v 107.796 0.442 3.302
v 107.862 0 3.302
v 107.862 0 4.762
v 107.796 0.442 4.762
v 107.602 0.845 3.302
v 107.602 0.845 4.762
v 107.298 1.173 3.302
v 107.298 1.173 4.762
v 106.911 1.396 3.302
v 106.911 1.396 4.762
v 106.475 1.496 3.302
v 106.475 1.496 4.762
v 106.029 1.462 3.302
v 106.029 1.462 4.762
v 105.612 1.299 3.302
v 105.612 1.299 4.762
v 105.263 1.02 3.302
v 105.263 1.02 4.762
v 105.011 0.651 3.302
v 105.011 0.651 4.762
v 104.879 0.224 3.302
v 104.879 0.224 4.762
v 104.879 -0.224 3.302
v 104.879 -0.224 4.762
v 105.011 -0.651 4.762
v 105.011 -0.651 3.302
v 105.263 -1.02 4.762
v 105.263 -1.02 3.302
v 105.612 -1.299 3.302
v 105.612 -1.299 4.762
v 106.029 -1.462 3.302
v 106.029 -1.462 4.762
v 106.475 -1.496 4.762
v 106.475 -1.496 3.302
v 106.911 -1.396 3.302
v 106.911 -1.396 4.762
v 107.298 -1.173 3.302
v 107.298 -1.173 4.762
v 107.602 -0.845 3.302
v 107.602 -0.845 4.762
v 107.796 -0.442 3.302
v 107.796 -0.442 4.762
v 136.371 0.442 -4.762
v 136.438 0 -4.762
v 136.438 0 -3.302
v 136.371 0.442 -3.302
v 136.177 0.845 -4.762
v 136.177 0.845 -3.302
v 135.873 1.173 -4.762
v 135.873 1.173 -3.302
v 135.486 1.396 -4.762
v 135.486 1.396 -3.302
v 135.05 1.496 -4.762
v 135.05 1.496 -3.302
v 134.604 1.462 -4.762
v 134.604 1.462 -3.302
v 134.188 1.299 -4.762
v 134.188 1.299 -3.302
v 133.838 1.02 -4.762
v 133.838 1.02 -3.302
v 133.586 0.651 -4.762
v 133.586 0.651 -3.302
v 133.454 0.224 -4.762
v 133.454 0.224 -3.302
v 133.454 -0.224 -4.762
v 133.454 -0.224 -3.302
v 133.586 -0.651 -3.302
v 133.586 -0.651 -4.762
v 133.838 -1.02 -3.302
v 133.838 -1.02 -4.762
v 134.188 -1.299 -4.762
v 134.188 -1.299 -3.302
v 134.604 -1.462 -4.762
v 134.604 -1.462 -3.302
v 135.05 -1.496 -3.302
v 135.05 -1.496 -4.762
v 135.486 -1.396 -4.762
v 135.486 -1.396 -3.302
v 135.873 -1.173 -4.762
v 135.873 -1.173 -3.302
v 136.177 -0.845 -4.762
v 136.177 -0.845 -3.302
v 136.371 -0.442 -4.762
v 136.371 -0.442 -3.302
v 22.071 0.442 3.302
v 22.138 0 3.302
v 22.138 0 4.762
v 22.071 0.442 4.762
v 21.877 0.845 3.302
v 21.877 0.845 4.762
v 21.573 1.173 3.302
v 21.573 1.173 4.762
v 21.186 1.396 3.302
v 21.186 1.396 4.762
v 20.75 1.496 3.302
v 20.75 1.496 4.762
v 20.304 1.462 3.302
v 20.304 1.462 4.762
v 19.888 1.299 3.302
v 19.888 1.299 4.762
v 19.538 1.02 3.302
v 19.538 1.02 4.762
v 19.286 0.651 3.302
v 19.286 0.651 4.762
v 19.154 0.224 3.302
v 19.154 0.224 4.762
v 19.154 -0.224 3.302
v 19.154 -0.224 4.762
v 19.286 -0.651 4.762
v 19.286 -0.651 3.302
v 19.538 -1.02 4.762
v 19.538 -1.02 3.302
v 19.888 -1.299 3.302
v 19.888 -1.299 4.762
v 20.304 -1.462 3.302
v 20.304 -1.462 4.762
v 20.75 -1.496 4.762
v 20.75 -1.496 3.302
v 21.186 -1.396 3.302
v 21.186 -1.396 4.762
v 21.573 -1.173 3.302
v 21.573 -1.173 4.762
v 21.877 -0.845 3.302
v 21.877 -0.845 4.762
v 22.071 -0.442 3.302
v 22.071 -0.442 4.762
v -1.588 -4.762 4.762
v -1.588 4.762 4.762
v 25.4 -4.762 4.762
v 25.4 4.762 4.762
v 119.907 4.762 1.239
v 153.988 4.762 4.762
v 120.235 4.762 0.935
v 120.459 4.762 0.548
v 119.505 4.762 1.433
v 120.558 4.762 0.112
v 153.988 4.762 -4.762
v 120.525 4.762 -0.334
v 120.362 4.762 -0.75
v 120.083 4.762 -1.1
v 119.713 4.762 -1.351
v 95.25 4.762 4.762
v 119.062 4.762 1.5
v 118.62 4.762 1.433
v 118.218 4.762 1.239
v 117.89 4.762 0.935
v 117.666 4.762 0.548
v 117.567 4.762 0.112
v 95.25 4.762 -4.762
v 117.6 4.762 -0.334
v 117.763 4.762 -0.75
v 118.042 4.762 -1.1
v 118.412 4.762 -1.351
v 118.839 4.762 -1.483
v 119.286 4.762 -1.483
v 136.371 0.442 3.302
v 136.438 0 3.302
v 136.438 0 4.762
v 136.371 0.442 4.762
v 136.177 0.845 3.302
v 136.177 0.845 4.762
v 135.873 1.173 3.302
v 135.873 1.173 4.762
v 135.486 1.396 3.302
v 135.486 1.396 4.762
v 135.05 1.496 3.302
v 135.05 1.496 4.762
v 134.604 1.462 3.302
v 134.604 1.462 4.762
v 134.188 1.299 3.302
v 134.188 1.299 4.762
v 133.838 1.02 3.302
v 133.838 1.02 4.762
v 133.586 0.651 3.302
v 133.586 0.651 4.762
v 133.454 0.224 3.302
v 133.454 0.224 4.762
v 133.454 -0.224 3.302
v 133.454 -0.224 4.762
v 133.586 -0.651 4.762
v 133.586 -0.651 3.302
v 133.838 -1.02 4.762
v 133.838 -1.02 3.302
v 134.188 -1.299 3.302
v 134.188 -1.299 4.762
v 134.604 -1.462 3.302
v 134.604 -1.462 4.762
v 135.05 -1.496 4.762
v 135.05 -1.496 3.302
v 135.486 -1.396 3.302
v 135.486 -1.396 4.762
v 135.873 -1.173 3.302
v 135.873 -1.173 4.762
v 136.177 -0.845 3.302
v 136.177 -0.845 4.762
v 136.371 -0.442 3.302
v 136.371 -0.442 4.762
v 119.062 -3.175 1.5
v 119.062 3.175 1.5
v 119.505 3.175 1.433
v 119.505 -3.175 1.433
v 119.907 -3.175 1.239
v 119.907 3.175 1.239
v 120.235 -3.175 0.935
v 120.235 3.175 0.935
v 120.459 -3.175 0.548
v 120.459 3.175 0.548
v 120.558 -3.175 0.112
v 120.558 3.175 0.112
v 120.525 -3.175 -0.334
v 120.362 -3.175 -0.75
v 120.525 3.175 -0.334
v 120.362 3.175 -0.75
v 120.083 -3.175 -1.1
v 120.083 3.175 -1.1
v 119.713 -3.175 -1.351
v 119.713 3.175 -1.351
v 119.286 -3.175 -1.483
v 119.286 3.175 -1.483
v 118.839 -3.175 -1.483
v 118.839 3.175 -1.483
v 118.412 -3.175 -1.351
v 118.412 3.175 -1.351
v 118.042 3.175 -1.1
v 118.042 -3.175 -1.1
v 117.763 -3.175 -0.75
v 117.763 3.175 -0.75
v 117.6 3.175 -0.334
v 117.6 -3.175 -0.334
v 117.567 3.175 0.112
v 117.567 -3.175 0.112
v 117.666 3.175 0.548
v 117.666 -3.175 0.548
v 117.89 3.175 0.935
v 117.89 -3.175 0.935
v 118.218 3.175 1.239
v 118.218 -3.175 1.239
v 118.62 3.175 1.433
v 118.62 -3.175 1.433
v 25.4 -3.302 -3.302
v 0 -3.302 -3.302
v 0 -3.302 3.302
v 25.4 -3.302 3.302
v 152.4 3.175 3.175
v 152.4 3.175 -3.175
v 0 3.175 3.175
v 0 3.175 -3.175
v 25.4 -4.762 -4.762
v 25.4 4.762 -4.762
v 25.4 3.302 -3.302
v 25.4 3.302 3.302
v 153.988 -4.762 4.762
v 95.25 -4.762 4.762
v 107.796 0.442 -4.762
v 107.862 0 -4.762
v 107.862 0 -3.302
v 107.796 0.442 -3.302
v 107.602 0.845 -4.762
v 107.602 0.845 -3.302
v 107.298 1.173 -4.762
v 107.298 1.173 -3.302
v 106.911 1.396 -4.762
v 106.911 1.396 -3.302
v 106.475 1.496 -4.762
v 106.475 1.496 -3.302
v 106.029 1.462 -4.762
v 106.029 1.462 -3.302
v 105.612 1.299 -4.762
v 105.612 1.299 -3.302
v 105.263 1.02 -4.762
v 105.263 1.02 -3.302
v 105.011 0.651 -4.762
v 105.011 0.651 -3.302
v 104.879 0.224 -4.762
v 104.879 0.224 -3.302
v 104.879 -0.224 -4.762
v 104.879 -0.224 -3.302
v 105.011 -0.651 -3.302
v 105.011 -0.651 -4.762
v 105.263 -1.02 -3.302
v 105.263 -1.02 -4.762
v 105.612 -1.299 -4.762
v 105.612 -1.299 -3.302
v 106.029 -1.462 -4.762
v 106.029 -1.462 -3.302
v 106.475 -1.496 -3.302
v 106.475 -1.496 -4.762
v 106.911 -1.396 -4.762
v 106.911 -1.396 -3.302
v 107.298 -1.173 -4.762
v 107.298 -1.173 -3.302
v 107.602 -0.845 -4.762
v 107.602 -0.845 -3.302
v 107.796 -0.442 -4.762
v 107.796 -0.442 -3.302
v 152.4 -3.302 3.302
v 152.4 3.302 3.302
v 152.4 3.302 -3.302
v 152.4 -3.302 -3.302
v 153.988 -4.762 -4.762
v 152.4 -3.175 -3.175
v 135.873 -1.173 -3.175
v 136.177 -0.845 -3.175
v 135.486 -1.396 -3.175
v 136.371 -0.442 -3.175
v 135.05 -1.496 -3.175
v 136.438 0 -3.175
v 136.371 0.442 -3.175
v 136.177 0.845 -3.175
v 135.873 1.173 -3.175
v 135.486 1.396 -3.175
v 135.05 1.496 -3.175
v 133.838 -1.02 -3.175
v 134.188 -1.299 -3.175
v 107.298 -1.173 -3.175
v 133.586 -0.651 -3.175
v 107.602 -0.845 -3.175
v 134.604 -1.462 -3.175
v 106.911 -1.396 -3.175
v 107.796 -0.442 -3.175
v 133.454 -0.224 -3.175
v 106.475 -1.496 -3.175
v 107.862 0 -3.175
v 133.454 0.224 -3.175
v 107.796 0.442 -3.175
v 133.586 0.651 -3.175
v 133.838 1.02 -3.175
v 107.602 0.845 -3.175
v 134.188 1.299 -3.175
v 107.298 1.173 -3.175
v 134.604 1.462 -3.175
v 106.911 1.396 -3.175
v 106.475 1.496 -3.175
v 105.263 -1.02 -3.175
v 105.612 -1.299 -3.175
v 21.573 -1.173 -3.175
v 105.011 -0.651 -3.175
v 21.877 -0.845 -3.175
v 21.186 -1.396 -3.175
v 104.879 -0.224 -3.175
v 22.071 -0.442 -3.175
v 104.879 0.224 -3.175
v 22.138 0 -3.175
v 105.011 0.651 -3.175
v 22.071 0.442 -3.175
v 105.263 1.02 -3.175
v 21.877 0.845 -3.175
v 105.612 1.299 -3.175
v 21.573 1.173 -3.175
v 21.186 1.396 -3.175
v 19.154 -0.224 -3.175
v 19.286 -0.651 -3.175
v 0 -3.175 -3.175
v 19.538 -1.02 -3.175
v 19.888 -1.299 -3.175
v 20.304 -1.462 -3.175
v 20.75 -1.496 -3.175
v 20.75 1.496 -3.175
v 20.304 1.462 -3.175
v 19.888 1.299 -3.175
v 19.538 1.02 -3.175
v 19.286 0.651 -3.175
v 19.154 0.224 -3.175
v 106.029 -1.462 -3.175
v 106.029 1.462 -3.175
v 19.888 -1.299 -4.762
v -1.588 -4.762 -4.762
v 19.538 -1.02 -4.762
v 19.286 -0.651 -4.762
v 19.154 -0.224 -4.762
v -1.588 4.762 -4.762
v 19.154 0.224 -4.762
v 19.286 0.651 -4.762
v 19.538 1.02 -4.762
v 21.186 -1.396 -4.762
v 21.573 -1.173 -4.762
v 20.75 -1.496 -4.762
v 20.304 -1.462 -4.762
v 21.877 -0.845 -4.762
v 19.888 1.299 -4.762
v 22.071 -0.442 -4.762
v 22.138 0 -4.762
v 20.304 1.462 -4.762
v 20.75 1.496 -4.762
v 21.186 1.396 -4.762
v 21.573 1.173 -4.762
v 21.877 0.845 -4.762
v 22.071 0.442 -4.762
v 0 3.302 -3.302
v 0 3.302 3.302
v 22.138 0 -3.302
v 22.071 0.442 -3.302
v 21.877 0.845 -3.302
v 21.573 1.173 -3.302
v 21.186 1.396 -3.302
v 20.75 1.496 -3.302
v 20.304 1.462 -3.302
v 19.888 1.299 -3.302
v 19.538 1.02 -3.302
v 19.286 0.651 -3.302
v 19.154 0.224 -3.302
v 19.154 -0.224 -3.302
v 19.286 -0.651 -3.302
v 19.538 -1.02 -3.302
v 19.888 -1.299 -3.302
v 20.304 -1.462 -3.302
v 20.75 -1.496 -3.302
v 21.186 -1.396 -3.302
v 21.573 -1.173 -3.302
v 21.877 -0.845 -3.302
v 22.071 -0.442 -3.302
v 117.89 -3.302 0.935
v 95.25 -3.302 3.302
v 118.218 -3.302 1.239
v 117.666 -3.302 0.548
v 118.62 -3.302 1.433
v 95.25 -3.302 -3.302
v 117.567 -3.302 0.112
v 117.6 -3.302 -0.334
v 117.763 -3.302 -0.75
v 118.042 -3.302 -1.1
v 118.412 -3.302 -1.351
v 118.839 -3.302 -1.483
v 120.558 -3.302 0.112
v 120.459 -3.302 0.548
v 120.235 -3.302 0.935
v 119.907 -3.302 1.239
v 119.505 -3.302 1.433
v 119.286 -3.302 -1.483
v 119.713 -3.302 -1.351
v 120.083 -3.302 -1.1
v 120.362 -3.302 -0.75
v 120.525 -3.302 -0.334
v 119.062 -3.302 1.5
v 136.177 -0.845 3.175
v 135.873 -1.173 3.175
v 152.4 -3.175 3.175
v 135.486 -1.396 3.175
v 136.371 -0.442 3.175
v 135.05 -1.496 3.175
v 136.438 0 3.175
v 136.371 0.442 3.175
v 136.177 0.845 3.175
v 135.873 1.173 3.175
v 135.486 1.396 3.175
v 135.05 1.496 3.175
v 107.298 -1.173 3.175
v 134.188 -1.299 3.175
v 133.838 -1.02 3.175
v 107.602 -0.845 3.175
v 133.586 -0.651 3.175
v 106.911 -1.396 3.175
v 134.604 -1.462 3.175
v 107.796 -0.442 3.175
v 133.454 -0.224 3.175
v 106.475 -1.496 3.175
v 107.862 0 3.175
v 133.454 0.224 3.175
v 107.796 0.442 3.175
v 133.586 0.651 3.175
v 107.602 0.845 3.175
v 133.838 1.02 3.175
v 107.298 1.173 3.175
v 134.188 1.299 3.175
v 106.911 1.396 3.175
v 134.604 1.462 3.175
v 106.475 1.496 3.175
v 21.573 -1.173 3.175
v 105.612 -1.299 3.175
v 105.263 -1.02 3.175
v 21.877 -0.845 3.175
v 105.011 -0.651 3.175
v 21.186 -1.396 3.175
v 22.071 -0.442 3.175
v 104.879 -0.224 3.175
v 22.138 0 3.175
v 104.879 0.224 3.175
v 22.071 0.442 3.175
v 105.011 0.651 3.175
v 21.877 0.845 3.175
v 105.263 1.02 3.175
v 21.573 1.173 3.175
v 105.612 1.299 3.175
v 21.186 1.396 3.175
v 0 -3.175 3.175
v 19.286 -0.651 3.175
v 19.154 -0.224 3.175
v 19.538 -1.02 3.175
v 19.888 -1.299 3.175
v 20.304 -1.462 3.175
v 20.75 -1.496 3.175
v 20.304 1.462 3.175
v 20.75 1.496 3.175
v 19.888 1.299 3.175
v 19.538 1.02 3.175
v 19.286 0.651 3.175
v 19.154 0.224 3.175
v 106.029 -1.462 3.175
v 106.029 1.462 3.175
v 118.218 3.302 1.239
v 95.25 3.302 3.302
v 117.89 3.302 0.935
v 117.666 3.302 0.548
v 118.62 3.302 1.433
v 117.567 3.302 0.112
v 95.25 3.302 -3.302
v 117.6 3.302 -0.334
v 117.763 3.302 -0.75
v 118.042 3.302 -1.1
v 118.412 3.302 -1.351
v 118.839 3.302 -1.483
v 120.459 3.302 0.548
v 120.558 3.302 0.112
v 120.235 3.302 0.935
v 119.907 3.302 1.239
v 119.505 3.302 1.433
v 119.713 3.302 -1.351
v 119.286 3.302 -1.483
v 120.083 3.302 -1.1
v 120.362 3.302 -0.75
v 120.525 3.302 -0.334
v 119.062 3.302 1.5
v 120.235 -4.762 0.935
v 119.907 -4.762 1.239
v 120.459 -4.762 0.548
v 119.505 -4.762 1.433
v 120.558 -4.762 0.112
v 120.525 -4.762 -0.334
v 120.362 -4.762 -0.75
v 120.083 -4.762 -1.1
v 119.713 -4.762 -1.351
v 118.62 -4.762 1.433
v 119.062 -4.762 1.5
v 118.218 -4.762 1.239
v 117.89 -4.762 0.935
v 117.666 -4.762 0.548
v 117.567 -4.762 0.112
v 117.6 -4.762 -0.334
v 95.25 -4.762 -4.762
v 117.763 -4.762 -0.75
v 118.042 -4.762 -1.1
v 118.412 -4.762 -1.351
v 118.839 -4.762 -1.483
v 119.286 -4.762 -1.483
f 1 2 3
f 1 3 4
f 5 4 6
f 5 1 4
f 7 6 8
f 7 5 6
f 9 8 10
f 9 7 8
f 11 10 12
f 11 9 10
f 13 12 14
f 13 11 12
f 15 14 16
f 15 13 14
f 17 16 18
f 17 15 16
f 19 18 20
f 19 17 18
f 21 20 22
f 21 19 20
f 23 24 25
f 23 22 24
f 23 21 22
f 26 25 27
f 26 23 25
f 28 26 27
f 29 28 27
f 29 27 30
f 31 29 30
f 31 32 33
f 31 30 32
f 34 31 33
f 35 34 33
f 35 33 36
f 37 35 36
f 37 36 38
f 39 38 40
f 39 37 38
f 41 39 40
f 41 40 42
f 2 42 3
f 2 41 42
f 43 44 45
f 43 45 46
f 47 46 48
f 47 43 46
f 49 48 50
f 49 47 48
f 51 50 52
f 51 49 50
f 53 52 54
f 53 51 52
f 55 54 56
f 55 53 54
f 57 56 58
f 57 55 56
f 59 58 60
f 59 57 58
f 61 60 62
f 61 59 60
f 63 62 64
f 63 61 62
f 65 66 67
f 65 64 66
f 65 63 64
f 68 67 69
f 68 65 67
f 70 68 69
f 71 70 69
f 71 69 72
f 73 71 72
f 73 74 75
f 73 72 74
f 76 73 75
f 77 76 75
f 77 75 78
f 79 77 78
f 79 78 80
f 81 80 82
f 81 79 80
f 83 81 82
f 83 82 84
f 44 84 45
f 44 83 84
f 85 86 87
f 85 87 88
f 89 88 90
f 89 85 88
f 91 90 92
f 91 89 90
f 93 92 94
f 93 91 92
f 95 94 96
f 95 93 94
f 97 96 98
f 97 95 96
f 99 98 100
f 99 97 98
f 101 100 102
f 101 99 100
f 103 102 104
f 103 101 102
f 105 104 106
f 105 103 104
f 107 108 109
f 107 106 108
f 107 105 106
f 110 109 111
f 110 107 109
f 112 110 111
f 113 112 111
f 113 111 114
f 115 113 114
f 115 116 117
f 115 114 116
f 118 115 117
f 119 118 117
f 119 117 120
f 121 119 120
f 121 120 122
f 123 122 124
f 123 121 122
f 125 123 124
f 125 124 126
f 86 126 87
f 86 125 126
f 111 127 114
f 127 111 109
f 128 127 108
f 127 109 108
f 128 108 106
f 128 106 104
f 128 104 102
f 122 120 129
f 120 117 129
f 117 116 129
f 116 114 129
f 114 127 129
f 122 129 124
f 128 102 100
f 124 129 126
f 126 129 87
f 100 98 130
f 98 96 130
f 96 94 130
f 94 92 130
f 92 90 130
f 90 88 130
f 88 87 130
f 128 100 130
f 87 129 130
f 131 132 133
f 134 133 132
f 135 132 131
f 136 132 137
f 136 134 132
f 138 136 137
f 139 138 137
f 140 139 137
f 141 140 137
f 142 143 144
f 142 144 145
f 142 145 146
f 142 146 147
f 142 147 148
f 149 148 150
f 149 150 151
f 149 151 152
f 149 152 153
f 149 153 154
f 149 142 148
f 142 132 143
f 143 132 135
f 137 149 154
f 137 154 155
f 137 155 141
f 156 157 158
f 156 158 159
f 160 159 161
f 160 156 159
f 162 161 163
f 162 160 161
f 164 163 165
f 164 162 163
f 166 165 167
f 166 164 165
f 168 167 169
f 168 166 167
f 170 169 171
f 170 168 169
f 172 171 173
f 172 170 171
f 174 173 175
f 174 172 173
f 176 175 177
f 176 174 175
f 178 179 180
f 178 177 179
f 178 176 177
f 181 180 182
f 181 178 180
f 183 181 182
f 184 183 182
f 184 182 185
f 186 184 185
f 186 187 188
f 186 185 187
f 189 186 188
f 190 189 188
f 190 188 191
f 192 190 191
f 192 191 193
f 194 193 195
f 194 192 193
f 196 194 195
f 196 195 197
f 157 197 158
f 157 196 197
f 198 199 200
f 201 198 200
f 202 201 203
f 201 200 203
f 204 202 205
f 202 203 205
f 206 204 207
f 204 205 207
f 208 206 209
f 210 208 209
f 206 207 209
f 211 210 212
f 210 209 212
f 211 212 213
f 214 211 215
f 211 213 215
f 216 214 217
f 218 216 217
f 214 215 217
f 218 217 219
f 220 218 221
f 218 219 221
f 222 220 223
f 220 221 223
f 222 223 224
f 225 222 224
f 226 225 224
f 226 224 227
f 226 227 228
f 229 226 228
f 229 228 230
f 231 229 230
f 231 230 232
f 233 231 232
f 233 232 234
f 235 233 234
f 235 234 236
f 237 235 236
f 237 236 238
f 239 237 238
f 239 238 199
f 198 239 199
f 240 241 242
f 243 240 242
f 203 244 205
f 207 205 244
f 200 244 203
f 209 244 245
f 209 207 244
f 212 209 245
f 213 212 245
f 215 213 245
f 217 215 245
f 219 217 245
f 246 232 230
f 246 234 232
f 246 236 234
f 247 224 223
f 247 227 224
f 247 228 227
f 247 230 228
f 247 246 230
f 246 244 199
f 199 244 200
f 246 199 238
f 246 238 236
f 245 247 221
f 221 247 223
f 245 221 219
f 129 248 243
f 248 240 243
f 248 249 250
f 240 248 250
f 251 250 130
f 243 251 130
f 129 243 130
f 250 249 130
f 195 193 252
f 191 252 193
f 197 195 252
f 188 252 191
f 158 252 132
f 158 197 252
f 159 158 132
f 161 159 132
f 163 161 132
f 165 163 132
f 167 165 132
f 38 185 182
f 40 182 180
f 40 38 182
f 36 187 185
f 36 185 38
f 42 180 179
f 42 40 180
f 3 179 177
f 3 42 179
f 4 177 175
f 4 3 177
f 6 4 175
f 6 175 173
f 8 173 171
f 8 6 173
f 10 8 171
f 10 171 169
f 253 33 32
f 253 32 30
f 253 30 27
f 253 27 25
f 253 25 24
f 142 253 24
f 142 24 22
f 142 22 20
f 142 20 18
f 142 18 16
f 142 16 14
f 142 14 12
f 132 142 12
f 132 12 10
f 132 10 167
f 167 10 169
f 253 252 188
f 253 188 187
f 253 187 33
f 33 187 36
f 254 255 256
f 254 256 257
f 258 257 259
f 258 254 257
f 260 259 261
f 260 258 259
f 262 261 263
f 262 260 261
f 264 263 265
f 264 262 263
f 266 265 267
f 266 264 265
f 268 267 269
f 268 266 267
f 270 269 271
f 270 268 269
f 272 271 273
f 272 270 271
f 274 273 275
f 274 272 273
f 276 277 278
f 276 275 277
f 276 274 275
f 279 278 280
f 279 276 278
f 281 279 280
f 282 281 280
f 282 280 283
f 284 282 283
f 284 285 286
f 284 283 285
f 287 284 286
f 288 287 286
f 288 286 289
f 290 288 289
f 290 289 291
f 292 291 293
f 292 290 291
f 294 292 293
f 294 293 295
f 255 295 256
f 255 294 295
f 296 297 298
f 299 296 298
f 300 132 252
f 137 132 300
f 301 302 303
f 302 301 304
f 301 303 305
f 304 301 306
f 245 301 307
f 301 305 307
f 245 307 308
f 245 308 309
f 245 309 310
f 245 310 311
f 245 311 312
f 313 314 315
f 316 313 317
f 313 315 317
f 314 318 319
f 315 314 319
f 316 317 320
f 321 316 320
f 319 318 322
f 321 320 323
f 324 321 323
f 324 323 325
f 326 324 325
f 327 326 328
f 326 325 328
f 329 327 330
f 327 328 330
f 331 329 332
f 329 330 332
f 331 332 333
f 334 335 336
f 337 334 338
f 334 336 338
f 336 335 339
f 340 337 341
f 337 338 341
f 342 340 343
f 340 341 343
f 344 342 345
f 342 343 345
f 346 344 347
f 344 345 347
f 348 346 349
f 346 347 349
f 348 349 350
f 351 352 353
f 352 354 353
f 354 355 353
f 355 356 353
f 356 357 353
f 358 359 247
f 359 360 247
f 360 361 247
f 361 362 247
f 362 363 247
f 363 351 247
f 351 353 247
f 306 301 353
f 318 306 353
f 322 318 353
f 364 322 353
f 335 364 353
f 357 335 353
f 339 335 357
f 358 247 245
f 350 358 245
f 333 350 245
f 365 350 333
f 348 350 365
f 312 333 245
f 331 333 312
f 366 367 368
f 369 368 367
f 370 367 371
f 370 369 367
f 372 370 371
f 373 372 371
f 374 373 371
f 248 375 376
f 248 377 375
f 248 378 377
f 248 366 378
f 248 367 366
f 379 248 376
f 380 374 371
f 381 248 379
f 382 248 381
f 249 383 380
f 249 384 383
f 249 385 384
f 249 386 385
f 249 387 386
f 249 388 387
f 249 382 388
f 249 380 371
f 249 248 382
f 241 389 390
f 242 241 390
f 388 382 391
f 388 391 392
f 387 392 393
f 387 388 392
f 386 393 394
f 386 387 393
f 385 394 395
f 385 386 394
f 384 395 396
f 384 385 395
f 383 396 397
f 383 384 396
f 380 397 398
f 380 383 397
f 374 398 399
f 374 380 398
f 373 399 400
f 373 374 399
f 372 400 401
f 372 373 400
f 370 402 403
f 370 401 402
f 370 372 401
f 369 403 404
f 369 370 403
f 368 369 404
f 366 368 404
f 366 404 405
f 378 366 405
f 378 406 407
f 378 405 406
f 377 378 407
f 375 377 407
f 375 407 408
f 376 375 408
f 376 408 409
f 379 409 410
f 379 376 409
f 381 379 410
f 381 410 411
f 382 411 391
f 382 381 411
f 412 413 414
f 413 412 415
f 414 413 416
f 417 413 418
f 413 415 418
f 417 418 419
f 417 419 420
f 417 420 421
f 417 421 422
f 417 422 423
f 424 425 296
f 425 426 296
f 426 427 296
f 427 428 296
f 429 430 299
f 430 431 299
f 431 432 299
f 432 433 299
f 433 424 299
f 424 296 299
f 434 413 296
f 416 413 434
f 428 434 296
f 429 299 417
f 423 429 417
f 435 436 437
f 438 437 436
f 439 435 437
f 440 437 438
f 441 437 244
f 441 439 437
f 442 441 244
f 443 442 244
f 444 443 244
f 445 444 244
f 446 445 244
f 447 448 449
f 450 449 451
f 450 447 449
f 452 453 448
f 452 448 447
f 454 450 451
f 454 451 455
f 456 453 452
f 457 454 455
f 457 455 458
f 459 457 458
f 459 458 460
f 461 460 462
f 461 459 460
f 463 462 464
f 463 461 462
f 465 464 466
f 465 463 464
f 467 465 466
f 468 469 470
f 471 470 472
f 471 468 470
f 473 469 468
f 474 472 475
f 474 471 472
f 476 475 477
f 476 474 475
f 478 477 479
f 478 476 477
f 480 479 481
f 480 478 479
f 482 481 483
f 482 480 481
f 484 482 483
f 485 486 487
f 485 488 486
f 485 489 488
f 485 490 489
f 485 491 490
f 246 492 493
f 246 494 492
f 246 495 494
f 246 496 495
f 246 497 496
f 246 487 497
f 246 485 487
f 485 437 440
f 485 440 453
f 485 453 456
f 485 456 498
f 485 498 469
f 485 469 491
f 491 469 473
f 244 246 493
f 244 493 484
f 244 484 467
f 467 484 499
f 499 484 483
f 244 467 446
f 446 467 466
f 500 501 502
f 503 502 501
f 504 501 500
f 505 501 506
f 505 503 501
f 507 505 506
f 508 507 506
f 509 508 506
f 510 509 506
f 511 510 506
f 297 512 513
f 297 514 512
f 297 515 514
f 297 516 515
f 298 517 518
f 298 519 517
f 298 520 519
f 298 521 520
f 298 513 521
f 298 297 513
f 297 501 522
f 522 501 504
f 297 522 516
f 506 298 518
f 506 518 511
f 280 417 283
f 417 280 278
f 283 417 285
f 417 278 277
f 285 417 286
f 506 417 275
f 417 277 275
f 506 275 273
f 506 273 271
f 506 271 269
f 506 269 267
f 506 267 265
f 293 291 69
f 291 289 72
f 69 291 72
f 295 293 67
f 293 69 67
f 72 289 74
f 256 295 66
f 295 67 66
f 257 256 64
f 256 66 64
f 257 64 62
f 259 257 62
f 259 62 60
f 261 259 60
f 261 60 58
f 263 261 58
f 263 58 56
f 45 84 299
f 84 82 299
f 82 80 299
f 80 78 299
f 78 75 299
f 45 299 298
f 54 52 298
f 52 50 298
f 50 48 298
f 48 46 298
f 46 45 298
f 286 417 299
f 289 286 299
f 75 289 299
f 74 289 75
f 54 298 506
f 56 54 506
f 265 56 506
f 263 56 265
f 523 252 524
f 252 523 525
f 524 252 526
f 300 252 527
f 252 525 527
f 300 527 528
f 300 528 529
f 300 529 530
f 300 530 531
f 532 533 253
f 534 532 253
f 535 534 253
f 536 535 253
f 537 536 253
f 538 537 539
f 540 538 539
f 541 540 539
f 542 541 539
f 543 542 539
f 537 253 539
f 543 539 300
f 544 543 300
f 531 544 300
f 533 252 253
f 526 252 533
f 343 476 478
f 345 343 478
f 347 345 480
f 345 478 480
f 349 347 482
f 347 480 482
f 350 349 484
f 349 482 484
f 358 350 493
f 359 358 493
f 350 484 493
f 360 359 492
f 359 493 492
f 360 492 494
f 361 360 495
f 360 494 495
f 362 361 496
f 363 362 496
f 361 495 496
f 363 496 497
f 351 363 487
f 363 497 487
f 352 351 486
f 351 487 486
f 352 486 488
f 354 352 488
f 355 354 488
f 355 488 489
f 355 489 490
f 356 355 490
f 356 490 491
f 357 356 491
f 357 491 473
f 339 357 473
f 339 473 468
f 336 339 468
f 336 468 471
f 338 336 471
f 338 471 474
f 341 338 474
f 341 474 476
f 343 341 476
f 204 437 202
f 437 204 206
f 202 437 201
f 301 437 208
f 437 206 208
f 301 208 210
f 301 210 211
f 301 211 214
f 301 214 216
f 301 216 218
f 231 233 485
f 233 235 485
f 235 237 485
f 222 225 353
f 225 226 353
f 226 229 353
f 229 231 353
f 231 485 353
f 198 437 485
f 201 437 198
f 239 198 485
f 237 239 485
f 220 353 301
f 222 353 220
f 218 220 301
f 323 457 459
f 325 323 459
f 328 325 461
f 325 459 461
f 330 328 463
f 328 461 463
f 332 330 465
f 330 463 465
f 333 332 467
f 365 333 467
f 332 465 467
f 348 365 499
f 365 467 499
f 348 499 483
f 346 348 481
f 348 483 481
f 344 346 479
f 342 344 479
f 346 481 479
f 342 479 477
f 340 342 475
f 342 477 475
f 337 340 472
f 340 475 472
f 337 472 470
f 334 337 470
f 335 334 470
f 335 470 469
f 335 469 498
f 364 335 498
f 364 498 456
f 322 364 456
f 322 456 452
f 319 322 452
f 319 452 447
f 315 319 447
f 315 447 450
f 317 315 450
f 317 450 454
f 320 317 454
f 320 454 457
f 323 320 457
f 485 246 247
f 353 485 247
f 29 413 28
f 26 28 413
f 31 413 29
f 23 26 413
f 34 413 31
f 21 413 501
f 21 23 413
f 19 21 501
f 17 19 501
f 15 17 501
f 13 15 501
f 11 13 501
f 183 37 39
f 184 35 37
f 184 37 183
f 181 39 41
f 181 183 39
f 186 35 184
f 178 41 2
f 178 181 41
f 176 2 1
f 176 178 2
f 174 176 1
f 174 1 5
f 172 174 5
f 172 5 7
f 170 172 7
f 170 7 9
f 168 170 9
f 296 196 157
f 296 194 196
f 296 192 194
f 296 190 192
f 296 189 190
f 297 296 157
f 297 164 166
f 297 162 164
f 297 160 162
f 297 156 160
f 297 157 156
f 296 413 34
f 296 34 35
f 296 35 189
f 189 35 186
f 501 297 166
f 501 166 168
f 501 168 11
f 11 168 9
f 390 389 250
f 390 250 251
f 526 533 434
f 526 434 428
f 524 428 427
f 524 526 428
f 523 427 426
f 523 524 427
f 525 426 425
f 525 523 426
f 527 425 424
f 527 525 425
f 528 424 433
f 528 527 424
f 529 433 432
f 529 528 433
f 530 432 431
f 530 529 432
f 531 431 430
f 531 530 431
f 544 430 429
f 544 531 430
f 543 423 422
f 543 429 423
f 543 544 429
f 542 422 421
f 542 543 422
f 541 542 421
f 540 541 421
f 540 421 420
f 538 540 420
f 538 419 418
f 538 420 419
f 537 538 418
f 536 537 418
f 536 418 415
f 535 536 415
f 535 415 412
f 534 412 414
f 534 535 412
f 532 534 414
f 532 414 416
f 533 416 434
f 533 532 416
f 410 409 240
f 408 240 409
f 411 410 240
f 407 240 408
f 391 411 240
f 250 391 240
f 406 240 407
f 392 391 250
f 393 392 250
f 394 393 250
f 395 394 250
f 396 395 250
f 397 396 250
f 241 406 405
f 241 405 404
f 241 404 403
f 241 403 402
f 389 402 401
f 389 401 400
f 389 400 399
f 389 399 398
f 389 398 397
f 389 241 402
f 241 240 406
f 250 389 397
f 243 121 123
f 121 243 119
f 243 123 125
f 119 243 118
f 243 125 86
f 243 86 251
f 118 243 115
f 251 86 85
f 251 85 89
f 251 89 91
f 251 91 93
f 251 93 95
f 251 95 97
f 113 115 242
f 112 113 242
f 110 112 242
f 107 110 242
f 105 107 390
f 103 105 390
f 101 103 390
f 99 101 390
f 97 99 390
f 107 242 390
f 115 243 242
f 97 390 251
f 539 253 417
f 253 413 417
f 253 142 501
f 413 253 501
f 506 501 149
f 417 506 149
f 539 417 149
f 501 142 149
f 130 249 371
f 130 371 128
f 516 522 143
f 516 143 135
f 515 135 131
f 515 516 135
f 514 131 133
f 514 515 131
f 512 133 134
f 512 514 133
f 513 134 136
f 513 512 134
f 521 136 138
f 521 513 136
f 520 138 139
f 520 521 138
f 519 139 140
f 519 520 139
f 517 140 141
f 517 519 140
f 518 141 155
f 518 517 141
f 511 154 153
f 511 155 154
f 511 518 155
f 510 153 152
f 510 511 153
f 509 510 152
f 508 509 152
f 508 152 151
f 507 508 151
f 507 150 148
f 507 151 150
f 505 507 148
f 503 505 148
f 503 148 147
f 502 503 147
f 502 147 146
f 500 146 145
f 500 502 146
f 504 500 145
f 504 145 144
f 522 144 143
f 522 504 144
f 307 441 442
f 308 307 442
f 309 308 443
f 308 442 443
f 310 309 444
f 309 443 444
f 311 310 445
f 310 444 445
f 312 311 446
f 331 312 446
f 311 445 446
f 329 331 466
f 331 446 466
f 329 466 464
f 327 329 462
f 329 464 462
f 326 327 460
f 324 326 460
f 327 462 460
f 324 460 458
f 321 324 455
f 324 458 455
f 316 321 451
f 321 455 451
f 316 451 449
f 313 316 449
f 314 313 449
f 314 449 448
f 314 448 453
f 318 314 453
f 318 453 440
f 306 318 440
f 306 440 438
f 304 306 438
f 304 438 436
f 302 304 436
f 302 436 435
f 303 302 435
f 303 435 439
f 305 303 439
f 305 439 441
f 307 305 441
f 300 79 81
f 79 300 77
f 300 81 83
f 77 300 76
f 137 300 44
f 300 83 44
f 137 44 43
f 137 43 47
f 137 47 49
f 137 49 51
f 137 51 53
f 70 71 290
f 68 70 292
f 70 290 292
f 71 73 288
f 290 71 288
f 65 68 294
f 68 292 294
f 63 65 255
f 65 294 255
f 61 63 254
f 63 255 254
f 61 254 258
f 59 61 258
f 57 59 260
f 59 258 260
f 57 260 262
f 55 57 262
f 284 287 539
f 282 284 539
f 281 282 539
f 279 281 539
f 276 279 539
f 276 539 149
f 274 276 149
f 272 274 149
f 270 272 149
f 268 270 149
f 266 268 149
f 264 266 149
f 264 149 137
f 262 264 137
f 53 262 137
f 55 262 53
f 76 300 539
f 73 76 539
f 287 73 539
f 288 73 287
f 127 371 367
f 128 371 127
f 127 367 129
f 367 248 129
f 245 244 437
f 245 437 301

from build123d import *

# Parameters (mm, degrees)
SKETCH1_W               = 6.35
SKETCH1_H               = 6.35
BOSS_EXTRUDE1_DEPTH     = 152.4
SKETCH2_R               = 1.5
CUT_EXTRUDE1_DEPTH      = 153.565274965
SKETCH3_R               = 1.5
CUT_EXTRUDE2_DEPTH      = 153.565274965
SKETCH4_W               = 9.525
SKETCH4_H               = 9.525
SKETCH4_W_2             = 6.604
SKETCH4_H_2             = 6.604
BOSS_EXTRUDE2_DEPTH     = 57.15
SKETCH5_W               = 9.525
SKETCH5_H               = 9.525
BOSS_EXTRUDE3_DEPTH     = 1.5875
CUT_EXTRUDE4_DEPTH      = 155.26547076
CUT_EXTRUDE4_DEPTH_BACK = 155.26547076
SKETCH6_R               = 1.5
CUT_EXTRUDE6_DEPTH      = 155.26547076
CUT_EXTRUDE6_DEPTH_BACK = 155.26547076
SKETCH7_R               = 1.5
SKETCH8_W               = 9.525
SKETCH8_H               = 9.525
SKETCH8_W_2             = 6.604
SKETCH8_H_2             = 6.604
BOSS_EXTRUDE4_DEPTH     = 25.4
SKETCH9_W               = 9.525
SKETCH9_H               = 9.525
BOSS_EXTRUDE5_DEPTH     = 1.5875
CUT_EXTRUDE8_DEPTH      = 155.26547076
CUT_EXTRUDE8_DEPTH_BACK = 155.26547076
SKETCH10_R              = 1.5


with BuildPart() as part:
    # Sketch1 → Boss-Extrude1 (new body)
    with BuildSketch(Plane(origin=(0, 0, 0), x_dir=(0, 0, -1), z_dir=(1, 0, 0))):
        Rectangle(SKETCH1_W, SKETCH1_H)
    extrude(amount=BOSS_EXTRUDE1_DEPTH)

    # Sketch2 → Cut-Extrude1 (cut, through all)
    with BuildSketch(Plane.XY.offset(3.175)):
        with Locations((20.6375, 0)):
            Circle(SKETCH2_R)
        with Locations((134.9375, 0)):
            Circle(SKETCH2_R)
        with Locations((106.3625, 0)):
            Circle(SKETCH2_R)
    extrude(amount=-CUT_EXTRUDE1_DEPTH, mode=Mode.SUBTRACT)

    # Sketch3 → Cut-Extrude2 (cut, through all)
    with BuildSketch(Plane(origin=(0, 3.175, 0), x_dir=(1, 0, 0), z_dir=(0, 1, 0))):
        with Locations(Location((119.0625, 0, 0), (0, 0, 270))):
            Circle(SKETCH3_R)
    extrude(amount=-CUT_EXTRUDE2_DEPTH, mode=Mode.SUBTRACT)


with BuildPart() as body_2:
    # Sketch4 → Boss-Extrude2 (new body)
    with BuildSketch(Plane(origin=(152.4, 0, 0), x_dir=(0, 0, -1), z_dir=(1, 0, 0))):
        Rectangle(SKETCH4_W, SKETCH4_H)
        Rectangle(SKETCH4_W_2, SKETCH4_H_2, mode=Mode.SUBTRACT)
    extrude(amount=-BOSS_EXTRUDE2_DEPTH)

    # Sketch5 → Boss-Extrude3 (add)
    with BuildSketch(Plane(origin=(152.4, 0, 0), x_dir=(0, 0, -1), z_dir=(1, 0, 0))):
        Rectangle(SKETCH5_W, SKETCH5_H)
    extrude(amount=BOSS_EXTRUDE3_DEPTH)

    # Sketch6 → Cut-Extrude4 (cut, two sides: drawn at the far end of the back side and taken through both)
    with BuildSketch(Plane.XY.offset(3.175).offset(-CUT_EXTRUDE4_DEPTH_BACK)):
        with Locations((134.9375, 0)):
            Circle(SKETCH6_R)
        with Locations((106.3625, 0)):
            Circle(SKETCH6_R)
    extrude(amount=CUT_EXTRUDE4_DEPTH + CUT_EXTRUDE4_DEPTH_BACK, mode=Mode.SUBTRACT)

    # Sketch7 → Cut-Extrude6 (cut, two sides: drawn at the far end of the back side and taken through both)
    with BuildSketch(Plane(origin=(0, 3.175, 0), x_dir=(1, 0, 0), z_dir=(0, 1, 0)).offset(-CUT_EXTRUDE6_DEPTH_BACK)):
        with Locations(Location((119.0625, 0, 0), (0, 0, 270))):
            Circle(SKETCH7_R)
    extrude(amount=CUT_EXTRUDE6_DEPTH + CUT_EXTRUDE6_DEPTH_BACK, mode=Mode.SUBTRACT)


with BuildPart() as body_3:
    # Sketch8 → Boss-Extrude4 (new body)
    with BuildSketch(Plane.ZY):
        Rectangle(SKETCH8_W, SKETCH8_H)
        Rectangle(SKETCH8_W_2, SKETCH8_H_2, mode=Mode.SUBTRACT)
    extrude(amount=-BOSS_EXTRUDE4_DEPTH)

    # Sketch9 → Boss-Extrude5 (add)
    with BuildSketch(Plane.ZY):
        Rectangle(SKETCH9_W, SKETCH9_H)
    extrude(amount=BOSS_EXTRUDE5_DEPTH)

    # Sketch10 → Cut-Extrude8 (cut, two sides: drawn at the far end of the back side and taken through both)
    with BuildSketch(Plane.XY.offset(3.175).offset(-CUT_EXTRUDE8_DEPTH_BACK)):
        with Locations((20.6375, 0)):
            Circle(SKETCH10_R)
    extrude(amount=CUT_EXTRUDE8_DEPTH + CUT_EXTRUDE8_DEPTH_BACK, mode=Mode.SUBTRACT)


solid = Compound([part.part, body_2.part, body_3.part])
